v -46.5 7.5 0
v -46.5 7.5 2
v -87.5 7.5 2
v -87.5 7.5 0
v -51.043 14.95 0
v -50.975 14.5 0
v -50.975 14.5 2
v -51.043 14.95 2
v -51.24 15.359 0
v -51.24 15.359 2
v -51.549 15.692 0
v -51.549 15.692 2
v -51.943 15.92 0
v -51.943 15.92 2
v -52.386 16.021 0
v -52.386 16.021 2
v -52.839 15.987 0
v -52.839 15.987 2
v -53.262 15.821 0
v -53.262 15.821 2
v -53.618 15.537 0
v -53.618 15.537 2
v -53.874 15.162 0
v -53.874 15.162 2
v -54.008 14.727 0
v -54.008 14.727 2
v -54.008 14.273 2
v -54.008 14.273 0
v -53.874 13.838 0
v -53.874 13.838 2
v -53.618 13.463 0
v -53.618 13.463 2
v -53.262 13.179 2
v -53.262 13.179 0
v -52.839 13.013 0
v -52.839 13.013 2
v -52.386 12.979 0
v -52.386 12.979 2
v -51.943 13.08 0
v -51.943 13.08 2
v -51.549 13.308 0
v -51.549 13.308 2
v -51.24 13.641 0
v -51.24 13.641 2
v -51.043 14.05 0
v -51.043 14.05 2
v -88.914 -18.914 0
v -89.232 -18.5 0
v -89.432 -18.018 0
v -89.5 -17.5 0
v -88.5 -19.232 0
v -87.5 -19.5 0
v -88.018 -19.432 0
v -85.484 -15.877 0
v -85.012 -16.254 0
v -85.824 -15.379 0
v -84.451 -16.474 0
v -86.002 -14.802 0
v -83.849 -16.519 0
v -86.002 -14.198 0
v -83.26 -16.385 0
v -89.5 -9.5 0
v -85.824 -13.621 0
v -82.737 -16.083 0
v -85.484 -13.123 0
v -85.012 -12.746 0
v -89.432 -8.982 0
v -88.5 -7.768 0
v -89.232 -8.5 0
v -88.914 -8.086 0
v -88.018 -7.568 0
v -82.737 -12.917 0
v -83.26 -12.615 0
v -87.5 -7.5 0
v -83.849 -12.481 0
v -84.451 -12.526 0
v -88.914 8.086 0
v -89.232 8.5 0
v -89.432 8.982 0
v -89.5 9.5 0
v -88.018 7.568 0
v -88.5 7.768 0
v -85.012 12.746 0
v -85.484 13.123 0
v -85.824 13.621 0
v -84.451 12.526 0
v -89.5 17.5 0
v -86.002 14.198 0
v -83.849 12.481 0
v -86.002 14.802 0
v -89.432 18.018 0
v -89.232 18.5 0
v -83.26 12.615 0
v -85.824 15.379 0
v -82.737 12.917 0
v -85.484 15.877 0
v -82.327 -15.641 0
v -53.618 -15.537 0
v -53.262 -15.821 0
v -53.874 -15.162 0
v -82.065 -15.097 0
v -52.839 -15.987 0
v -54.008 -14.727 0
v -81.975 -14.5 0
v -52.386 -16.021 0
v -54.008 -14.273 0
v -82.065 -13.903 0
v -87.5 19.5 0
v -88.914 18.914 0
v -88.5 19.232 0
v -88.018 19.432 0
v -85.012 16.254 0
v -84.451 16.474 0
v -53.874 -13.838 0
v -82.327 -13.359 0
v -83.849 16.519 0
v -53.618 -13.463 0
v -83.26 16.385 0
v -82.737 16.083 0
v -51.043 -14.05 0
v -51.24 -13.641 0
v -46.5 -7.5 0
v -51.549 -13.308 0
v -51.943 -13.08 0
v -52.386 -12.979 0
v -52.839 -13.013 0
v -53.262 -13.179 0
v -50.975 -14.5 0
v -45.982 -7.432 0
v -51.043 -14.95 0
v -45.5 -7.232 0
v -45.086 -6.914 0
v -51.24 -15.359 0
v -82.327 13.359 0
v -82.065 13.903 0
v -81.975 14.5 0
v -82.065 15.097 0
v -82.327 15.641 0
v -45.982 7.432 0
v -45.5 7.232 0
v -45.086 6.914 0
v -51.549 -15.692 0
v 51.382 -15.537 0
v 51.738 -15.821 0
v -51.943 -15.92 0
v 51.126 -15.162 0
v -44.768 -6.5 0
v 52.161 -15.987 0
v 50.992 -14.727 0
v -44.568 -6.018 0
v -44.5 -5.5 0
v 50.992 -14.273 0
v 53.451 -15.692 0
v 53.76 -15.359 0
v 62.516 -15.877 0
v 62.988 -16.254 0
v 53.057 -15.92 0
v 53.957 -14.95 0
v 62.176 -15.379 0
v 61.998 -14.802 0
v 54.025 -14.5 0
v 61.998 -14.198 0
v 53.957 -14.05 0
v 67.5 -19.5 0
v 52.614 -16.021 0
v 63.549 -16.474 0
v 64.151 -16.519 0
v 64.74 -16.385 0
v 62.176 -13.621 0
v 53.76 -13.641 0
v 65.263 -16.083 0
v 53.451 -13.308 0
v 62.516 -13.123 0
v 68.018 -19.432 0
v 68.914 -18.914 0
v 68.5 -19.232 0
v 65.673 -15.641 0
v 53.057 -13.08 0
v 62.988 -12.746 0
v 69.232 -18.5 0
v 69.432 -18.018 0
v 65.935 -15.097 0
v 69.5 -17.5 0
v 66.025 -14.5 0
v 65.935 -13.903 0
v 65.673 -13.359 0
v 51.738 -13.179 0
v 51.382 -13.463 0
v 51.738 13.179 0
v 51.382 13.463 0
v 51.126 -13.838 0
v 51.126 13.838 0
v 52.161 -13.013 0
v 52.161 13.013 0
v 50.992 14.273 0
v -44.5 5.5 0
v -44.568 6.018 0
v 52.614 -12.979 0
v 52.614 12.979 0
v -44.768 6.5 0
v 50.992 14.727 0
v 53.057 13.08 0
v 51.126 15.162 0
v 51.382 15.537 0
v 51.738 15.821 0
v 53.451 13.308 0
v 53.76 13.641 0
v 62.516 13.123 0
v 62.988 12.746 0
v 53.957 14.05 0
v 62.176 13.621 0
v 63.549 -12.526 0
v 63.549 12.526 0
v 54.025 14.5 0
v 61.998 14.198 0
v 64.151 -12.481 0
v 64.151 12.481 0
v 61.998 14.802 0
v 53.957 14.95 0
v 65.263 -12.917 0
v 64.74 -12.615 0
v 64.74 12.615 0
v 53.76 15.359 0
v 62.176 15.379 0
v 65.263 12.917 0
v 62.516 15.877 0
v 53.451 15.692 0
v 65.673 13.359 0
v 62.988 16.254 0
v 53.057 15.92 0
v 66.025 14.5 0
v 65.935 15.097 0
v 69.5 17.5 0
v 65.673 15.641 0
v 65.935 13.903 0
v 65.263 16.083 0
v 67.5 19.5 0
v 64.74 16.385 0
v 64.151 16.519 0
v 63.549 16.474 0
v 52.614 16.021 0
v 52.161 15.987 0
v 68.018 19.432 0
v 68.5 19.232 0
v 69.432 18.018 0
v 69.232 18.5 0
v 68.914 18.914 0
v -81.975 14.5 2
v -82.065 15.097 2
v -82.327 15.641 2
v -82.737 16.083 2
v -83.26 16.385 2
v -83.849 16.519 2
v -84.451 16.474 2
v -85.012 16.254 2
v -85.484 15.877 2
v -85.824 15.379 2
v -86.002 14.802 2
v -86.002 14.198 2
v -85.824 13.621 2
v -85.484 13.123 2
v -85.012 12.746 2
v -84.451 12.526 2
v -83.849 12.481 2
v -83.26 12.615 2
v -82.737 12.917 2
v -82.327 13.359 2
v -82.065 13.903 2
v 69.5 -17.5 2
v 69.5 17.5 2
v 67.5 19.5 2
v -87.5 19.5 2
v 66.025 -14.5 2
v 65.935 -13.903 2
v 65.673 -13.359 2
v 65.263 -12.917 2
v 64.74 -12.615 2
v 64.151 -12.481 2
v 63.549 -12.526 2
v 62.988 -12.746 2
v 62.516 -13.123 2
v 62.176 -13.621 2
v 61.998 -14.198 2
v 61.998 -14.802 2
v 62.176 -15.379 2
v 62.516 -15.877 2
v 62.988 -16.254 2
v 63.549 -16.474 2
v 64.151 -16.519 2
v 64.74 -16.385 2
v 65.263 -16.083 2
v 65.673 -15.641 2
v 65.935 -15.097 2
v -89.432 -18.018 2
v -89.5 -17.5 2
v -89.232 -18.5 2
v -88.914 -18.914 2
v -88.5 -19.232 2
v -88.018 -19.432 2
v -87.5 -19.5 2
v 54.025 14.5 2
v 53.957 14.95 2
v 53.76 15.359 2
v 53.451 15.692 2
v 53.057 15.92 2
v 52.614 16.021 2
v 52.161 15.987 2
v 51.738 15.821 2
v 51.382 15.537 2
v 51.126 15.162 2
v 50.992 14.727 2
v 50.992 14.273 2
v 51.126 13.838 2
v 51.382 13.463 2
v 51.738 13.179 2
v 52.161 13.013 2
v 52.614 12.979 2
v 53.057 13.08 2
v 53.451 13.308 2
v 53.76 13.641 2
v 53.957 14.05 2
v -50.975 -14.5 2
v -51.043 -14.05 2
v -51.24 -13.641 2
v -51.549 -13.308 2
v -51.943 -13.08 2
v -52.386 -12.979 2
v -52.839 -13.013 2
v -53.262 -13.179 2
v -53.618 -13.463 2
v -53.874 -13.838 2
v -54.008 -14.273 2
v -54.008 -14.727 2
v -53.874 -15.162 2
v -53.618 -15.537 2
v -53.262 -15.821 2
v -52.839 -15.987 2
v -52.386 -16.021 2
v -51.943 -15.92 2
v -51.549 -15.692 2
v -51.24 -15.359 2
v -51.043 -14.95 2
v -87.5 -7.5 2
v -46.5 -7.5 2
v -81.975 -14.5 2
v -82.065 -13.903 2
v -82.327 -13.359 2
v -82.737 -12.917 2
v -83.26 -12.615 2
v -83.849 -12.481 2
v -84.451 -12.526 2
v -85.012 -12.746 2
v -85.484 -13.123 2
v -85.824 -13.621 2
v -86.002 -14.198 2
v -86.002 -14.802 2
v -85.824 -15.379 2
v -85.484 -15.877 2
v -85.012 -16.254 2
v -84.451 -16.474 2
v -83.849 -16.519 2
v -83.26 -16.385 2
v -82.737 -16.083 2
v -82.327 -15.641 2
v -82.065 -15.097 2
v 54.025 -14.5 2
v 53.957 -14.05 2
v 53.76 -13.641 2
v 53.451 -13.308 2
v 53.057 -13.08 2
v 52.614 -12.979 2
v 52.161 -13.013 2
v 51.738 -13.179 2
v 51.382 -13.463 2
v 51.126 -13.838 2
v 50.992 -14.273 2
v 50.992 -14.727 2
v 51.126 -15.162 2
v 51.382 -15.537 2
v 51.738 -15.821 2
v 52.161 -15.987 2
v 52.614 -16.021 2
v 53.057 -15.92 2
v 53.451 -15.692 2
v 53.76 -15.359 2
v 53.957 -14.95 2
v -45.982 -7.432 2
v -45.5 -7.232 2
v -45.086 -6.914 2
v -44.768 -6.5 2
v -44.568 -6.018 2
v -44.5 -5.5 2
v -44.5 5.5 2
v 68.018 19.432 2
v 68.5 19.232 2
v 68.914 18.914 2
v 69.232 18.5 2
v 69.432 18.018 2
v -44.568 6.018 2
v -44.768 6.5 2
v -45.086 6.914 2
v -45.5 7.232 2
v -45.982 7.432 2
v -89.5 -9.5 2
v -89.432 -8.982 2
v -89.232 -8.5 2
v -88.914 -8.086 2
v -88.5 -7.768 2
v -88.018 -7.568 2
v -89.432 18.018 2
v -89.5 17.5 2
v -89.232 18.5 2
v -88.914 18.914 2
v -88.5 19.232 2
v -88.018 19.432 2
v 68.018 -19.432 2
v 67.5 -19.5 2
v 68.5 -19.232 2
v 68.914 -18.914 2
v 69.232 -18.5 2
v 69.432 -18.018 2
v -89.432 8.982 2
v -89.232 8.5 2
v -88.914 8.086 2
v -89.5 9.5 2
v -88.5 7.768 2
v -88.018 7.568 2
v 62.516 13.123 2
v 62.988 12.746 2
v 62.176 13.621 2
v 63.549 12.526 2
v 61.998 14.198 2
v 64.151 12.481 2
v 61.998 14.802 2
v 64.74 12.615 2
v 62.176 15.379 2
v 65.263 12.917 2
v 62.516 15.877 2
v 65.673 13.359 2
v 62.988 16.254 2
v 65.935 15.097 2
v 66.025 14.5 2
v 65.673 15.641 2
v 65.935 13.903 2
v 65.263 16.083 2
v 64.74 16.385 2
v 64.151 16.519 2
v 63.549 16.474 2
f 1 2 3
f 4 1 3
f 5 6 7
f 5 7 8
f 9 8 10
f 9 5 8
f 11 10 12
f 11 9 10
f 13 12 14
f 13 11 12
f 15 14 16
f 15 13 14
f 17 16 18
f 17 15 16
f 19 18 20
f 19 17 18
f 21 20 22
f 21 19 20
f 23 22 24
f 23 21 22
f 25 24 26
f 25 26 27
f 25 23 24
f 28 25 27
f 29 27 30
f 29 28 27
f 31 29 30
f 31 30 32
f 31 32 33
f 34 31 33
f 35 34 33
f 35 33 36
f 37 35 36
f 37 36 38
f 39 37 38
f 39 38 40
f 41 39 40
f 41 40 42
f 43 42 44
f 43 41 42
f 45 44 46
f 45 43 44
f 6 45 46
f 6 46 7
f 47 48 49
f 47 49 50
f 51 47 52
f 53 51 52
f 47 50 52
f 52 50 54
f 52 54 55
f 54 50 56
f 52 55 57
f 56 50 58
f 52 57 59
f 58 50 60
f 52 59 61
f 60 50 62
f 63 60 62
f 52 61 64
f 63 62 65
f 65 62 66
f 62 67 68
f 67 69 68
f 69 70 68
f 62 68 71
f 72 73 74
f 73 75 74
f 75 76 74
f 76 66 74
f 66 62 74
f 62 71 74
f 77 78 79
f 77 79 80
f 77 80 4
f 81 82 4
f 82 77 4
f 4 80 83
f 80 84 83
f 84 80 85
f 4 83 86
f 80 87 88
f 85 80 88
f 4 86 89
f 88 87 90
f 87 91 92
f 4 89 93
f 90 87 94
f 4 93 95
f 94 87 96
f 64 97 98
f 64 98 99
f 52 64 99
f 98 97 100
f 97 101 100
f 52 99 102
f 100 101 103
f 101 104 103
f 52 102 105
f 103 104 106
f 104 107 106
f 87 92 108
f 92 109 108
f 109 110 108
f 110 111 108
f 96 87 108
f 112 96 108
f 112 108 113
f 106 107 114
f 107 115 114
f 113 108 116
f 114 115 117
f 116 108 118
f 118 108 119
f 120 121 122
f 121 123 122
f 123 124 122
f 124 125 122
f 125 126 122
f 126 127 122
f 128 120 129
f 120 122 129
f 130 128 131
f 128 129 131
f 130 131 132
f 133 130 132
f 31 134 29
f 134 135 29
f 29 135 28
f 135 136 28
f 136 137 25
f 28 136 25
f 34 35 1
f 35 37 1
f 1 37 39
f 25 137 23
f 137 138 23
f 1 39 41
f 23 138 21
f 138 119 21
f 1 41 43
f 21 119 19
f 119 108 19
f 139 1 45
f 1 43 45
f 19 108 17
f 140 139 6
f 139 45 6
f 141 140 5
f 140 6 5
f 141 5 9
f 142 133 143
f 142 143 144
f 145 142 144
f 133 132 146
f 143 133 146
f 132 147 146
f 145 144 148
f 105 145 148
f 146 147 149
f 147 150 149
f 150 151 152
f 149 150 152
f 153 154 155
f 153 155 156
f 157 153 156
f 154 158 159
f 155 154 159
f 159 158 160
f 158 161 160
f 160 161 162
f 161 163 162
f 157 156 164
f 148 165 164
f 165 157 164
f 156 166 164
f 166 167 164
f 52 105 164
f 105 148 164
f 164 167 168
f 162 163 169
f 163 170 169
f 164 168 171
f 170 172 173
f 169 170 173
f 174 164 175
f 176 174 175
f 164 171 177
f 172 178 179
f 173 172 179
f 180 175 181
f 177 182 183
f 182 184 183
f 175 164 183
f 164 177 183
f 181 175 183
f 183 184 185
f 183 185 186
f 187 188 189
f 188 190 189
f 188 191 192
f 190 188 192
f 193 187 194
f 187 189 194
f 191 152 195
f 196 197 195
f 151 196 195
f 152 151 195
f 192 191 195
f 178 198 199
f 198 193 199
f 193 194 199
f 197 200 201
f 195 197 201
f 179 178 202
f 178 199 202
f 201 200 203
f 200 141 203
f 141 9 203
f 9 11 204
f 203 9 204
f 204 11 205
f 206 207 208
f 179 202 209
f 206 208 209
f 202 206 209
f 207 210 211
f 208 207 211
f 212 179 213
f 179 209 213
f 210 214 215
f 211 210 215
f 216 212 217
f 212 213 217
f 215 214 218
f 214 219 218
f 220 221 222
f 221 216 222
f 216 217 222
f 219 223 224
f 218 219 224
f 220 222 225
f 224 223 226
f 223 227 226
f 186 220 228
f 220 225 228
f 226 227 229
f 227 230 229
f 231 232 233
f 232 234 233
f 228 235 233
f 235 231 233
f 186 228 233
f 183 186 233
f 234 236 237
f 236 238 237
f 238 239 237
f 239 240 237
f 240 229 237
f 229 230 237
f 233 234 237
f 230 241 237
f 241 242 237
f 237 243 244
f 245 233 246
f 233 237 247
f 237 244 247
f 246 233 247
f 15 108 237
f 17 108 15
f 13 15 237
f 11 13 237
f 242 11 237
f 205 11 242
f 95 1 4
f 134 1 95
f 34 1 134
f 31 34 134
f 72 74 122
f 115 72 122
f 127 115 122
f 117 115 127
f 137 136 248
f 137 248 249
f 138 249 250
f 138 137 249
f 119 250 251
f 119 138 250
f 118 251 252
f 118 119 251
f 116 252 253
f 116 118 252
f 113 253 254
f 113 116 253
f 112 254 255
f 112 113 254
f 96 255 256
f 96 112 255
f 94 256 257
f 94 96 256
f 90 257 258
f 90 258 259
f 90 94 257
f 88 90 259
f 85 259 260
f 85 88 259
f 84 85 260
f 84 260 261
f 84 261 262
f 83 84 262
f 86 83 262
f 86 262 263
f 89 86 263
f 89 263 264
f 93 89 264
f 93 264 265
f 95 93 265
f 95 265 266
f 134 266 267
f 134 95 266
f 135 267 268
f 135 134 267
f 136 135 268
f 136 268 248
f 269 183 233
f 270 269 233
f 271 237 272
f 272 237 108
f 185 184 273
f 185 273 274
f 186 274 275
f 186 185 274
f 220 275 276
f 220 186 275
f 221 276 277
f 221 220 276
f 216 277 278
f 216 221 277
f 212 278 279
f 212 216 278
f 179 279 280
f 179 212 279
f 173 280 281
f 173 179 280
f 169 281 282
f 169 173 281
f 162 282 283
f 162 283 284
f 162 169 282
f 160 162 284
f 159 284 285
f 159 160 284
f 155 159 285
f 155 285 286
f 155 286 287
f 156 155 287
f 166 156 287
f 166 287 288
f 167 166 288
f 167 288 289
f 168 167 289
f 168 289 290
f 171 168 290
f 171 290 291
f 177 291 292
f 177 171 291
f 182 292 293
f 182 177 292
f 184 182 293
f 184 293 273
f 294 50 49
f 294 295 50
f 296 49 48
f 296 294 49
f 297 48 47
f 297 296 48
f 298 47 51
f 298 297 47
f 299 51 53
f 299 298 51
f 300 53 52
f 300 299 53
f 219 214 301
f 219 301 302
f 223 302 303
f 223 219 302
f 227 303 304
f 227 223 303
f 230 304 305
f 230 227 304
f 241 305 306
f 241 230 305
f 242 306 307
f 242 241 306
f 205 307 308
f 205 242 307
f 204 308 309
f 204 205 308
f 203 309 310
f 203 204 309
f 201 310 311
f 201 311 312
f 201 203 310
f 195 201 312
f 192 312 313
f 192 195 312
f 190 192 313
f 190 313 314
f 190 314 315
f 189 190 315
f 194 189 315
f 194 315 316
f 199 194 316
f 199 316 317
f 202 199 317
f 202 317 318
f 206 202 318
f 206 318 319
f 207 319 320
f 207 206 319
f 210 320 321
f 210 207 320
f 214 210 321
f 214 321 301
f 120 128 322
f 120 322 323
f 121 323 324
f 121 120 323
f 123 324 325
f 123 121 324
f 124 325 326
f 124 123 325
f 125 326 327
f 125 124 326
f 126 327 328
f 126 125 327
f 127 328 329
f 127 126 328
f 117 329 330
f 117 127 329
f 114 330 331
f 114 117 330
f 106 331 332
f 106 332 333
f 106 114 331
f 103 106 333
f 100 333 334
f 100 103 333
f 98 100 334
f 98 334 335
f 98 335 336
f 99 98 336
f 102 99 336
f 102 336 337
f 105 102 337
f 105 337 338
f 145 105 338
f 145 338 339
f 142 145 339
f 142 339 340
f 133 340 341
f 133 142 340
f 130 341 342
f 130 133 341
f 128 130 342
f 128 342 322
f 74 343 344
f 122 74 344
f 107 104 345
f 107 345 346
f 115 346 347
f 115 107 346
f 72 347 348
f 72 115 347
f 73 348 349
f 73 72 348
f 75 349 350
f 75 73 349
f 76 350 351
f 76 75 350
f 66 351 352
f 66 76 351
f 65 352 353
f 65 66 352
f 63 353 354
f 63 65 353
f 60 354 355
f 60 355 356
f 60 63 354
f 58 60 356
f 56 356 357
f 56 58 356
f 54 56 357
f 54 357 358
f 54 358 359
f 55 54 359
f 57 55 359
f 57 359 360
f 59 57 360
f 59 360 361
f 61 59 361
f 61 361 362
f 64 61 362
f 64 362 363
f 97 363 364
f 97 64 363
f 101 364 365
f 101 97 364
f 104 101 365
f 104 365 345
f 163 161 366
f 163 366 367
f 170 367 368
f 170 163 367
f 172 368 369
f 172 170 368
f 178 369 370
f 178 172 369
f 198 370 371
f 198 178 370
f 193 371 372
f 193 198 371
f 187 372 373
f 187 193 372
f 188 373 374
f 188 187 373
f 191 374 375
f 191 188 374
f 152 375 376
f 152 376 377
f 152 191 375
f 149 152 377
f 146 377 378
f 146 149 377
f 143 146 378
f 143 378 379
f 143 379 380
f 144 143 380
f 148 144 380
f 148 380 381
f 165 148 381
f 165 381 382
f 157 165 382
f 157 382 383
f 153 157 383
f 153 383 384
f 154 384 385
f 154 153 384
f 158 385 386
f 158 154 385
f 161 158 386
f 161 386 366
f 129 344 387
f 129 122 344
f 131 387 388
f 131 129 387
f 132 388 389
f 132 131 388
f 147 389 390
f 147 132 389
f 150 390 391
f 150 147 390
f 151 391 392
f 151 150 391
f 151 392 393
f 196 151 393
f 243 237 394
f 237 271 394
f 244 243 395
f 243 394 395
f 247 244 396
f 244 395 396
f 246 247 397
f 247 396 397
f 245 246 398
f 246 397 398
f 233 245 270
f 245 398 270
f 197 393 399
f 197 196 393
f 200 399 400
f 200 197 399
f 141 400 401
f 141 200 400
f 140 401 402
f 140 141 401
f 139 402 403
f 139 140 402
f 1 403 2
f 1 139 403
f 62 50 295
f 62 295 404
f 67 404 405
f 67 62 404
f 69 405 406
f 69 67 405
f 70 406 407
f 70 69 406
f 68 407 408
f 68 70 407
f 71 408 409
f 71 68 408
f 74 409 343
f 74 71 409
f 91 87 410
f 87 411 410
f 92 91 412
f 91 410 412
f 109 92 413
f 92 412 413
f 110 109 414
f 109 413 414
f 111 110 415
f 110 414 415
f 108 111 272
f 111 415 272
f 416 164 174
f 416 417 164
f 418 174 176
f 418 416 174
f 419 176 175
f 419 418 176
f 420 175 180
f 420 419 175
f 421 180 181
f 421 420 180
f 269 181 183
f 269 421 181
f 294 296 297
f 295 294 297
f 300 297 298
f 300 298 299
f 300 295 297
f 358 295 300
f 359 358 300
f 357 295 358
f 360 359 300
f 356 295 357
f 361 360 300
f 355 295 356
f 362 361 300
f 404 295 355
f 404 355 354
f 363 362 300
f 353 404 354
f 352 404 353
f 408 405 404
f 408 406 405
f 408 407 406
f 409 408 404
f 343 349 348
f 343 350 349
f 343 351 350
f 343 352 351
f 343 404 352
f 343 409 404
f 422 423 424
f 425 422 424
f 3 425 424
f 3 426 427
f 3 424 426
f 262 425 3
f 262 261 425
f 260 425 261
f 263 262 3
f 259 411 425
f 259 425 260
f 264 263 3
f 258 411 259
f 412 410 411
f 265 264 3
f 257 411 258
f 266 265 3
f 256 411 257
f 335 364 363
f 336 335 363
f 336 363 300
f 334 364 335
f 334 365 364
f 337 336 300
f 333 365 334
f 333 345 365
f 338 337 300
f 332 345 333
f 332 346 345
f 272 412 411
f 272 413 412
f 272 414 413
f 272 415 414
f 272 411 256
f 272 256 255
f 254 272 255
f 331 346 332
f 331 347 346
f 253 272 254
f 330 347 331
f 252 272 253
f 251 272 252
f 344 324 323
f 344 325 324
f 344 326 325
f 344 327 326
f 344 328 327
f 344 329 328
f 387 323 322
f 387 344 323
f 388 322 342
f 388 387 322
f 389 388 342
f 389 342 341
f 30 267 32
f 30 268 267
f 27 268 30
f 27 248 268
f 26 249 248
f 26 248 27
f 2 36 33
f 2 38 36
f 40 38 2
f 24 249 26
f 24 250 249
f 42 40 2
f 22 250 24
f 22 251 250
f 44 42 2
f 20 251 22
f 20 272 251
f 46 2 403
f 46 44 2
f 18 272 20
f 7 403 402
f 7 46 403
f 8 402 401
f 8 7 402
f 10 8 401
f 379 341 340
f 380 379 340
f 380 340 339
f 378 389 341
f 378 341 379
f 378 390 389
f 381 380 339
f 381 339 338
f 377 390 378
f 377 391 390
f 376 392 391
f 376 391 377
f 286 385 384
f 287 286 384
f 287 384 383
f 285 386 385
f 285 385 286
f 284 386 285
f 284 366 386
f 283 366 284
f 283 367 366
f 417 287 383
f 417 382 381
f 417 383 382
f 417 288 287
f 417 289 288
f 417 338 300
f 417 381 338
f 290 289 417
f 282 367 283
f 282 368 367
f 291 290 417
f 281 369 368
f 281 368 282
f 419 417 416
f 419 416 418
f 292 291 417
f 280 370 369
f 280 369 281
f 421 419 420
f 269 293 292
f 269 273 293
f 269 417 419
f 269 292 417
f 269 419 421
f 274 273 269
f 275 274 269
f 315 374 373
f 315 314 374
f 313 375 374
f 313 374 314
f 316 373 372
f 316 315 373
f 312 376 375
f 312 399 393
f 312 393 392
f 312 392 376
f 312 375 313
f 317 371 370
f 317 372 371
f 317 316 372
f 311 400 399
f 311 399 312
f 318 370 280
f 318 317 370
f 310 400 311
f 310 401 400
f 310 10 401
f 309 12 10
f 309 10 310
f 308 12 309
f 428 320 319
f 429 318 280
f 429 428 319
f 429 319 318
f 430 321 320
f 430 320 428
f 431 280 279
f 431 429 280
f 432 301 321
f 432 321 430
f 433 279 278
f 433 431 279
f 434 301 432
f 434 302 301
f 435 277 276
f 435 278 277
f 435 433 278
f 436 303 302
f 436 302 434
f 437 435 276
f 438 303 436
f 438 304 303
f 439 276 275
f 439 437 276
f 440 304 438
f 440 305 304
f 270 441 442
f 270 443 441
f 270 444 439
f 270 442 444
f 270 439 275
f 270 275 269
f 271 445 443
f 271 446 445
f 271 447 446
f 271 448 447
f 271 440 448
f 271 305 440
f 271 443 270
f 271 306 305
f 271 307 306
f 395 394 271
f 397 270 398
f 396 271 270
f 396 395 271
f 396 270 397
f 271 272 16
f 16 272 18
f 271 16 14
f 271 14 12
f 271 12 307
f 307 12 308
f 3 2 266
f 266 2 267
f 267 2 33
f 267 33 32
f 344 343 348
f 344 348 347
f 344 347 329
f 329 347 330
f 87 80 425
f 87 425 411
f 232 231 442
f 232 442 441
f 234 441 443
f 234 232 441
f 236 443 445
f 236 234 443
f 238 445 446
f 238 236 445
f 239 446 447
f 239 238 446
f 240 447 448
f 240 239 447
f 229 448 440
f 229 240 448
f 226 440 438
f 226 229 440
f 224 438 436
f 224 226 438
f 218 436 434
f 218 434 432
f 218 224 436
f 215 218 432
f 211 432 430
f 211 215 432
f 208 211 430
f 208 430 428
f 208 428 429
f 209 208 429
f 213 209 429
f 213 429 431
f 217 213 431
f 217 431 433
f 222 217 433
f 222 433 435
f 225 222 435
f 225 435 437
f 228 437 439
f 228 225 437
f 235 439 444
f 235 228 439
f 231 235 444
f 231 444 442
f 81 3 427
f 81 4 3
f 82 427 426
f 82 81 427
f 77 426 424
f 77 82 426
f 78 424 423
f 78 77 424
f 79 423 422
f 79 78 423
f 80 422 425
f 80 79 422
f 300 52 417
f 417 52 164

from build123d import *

# Parameters (mm, degrees)
SKETCH_1_W          = 32
SKETCH_1_H          = 39
SKETCH_1_R          = 2.025
SKETCH_1_W_2        = 115
SKETCH_1_R_2        = 1.525
SKETCH_1_W_3        = 12
EXTRUDE_1_DEPTH     = 2
SKETCH_2_W          = 19
SKETCH_2_H          = 15
SKETCH_2_W_2        = 26
CUT_EXTRUDE_1_DEPTH = 10
FILLET_1_R          = 2


with BuildPart() as part:
    # 草图1 → 凸台-拉伸1 (new body)
    with BuildSketch(Plane.XY):
        with Locations((-73.5, 0)):
            Rectangle(SKETCH_1_W, SKETCH_1_H)
        with Locations((-84, -14.5)):
            Circle(SKETCH_1_R, mode=Mode.SUBTRACT)
        with Locations((-84, 14.5)):
            Circle(SKETCH_1_R, mode=Mode.SUBTRACT)
        Rectangle(SKETCH_1_W_2, SKETCH_1_H)
        with Locations((52.5, 14.5)):
            Circle(SKETCH_1_R_2, mode=Mode.SUBTRACT)
        with Locations((52.5, -14.5)):
            Circle(SKETCH_1_R_2, mode=Mode.SUBTRACT)
        with Locations((-52.5, -14.5)):
            Circle(SKETCH_1_R_2, mode=Mode.SUBTRACT)
        with Locations((-52.5, 14.5)):
            Circle(SKETCH_1_R_2, mode=Mode.SUBTRACT)
        with Locations((63.5, 0)):
            Rectangle(SKETCH_1_W_3, SKETCH_1_H)
        with Locations((64, -14.5)):
            Circle(SKETCH_1_R, mode=Mode.SUBTRACT)
        with Locations((64, 14.5)):
            Circle(SKETCH_1_R, mode=Mode.SUBTRACT)
    extrude(amount=EXTRUDE_1_DEPTH)

    # 草图2 → 切除-拉伸1 (cut)
    with BuildSketch(Plane.XY.offset(2)):
        with Locations((-80, 0)):
            Rectangle(SKETCH_2_W, SKETCH_2_H)
        with Locations((-57.5, 0)):
            Rectangle(SKETCH_2_W_2, SKETCH_2_H)
    extrude(amount=-CUT_EXTRUDE_1_DEPTH, mode=Mode.SUBTRACT)

    # 圆角1
    fillet_1_edges = [part.edges().sort_by_distance(p)[0] for p in [
        (-89.5, 19.5, 1),
        (69.5, 19.5, 1),
        (69.5, -19.5, 1),
        (-89.5, -19.5, 1),
        (-44.5, -7.5, 1),
        (-89.5, -7.5, 1),
        (-89.5, 7.5, 1),
        (-44.5, 7.5, 1),
    ]]
    fillet(fillet_1_edges, radius=FILLET_1_R)


solid = part.part
